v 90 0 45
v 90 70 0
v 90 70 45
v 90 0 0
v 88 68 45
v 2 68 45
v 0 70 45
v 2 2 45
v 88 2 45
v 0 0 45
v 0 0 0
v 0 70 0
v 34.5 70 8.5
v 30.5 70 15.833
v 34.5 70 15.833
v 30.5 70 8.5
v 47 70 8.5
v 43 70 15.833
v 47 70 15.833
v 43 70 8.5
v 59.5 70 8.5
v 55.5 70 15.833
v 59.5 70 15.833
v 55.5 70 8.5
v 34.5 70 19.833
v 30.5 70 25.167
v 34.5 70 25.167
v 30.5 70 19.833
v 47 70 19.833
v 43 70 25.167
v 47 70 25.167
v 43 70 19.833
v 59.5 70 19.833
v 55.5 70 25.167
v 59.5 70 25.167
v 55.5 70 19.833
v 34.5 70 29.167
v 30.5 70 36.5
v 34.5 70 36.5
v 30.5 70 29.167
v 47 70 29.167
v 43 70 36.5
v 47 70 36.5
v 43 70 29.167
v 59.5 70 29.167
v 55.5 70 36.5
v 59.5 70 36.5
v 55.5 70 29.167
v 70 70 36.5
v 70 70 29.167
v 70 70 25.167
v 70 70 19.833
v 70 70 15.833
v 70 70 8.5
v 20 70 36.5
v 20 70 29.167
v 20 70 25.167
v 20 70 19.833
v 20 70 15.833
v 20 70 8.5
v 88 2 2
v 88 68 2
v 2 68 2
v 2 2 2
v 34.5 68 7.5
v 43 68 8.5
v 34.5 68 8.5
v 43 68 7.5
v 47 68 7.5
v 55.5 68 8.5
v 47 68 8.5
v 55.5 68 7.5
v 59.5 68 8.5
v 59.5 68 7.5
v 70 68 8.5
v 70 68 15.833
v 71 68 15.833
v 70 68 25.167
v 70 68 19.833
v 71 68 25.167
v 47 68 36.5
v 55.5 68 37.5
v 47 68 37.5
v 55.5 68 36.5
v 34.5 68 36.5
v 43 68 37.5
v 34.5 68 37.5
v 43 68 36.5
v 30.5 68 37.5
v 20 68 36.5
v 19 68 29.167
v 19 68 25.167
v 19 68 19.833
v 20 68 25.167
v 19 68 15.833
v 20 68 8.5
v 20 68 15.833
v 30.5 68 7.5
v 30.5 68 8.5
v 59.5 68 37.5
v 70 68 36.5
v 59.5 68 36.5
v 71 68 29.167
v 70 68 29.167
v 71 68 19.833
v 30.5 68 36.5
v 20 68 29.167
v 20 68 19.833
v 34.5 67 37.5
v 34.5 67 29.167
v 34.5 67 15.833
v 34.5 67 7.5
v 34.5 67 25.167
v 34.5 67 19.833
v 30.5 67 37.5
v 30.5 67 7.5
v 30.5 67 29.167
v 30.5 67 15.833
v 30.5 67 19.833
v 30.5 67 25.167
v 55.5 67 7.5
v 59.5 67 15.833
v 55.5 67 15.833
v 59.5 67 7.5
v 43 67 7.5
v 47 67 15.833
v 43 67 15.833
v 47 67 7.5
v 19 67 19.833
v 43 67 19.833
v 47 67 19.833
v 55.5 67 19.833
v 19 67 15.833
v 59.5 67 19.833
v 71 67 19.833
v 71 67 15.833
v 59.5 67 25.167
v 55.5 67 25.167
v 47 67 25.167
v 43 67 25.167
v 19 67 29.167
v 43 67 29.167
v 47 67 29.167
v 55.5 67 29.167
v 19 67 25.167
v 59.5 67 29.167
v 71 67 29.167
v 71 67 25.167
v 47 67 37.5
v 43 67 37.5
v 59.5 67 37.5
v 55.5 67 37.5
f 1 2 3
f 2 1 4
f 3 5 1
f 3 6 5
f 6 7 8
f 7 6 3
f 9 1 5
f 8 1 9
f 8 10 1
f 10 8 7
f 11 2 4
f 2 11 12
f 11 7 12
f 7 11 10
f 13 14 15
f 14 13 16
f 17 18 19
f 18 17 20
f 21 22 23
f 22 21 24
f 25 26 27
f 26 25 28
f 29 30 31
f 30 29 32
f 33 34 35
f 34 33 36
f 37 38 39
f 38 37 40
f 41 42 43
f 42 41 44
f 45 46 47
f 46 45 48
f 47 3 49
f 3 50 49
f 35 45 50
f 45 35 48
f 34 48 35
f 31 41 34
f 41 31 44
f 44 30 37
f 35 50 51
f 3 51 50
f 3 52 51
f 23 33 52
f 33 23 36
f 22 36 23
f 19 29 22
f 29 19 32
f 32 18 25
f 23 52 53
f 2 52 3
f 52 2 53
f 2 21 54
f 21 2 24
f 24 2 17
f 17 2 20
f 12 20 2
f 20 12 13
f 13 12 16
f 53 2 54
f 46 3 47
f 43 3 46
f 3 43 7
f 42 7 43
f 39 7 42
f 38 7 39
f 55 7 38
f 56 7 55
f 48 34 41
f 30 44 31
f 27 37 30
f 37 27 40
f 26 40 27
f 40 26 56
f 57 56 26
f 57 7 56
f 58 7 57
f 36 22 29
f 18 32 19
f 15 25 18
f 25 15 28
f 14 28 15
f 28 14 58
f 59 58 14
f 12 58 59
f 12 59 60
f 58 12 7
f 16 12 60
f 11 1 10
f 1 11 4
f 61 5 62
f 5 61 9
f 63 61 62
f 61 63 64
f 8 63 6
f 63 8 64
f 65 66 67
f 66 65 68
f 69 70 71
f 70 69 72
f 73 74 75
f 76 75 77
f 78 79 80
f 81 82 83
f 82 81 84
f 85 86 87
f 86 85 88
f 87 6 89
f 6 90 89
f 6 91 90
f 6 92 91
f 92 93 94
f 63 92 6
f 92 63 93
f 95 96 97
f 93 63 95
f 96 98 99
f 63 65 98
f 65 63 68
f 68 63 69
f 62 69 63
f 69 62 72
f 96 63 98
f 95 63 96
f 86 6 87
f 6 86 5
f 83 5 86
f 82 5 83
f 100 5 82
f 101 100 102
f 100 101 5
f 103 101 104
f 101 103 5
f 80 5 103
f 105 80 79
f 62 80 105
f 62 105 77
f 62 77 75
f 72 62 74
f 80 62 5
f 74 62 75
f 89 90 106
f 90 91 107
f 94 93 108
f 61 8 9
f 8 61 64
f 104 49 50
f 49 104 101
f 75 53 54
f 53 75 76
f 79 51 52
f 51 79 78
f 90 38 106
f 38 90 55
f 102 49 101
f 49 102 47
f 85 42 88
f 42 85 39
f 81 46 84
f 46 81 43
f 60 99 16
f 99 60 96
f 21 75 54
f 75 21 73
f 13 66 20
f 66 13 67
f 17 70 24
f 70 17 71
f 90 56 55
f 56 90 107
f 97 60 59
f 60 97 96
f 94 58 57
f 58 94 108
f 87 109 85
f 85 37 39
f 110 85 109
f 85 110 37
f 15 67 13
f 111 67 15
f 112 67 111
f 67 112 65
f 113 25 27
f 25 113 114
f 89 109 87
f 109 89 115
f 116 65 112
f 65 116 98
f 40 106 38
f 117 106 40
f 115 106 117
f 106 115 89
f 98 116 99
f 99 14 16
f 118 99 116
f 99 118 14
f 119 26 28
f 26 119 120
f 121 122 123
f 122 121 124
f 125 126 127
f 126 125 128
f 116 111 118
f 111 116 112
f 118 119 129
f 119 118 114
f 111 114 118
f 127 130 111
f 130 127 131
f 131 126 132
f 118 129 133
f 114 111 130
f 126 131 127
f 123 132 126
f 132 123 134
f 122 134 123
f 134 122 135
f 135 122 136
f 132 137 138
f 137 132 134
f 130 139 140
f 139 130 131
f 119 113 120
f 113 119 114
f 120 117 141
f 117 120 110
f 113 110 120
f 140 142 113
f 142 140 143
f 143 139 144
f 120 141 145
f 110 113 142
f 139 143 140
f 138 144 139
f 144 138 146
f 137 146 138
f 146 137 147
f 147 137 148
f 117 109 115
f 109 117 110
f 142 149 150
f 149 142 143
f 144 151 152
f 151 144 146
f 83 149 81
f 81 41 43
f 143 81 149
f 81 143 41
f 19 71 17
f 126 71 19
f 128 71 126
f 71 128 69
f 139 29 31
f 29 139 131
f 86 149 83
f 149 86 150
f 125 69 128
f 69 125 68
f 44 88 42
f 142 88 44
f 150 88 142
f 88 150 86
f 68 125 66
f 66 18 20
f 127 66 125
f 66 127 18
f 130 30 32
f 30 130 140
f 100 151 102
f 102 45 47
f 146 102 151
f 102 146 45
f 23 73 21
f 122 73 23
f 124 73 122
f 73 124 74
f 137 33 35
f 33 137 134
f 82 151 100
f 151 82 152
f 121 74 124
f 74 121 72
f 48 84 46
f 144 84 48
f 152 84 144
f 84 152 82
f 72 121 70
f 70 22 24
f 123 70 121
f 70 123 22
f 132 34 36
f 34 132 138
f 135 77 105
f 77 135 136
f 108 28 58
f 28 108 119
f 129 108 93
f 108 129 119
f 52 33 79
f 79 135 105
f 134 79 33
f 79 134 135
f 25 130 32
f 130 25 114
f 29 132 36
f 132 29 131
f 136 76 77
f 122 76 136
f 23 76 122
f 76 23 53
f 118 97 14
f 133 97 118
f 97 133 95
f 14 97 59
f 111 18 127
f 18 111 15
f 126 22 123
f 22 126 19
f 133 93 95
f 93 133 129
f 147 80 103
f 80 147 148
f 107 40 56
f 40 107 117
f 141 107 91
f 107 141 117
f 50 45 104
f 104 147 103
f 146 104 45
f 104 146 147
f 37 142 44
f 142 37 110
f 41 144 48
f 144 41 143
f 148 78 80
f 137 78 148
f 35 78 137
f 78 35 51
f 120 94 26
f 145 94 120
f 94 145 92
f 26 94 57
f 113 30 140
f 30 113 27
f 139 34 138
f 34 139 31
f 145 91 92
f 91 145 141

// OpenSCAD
$fn = 32;

// ----------------------------------------------------------------------
// Vent box: crossgrid enclosure
// ----------------------------------------------------------------------

// --- parameters (mm) ---
box_l = 90;               // box length, X
box_w = 70;               // box width, Y
box_h = 45;               // box height, Z
wall_t = 2;               // shell wall thickness
win_l = 50;               // vent window width, X
win_h = 28;               // vent window height, Z
bar_w = 4;                // grid bar width
n_v = 3;                  // vertical bar count
n_h = 2;                  // horizontal bar count

win_z0 = (box_h - win_h) / 2;  // window lower edge Z
v_step = win_l / (n_v + 1);  // vertical bar step
h_step = win_h / (n_h + 1);  // horizontal bar step

difference() {
  union() {
    difference() {
      cube([box_l, box_w, box_h]);
  translate([wall_t, wall_t, wall_t])
    cube([box_l - 2 * wall_t, box_w - 2 * wall_t, box_h]);
  translate([(box_l - win_l) / 2, box_w - wall_t - 1, win_z0])
    cube([win_l, wall_t + 2, win_h]);
    }
    for (i = [1 : n_v])
      translate([(box_l - win_l) / 2 + i * v_step - bar_w / 2,
                 box_w - wall_t - 1, win_z0 - 1])
        cube([bar_w, wall_t + 1, win_h + 2]);
    for (i = [1 : n_h])
      translate([(box_l - win_l) / 2 - 1, box_w - wall_t - 1,
                 win_z0 + i * h_step - bar_w / 2])
        cube([win_l + 2, wall_t + 1, bar_w]);
  }
}
